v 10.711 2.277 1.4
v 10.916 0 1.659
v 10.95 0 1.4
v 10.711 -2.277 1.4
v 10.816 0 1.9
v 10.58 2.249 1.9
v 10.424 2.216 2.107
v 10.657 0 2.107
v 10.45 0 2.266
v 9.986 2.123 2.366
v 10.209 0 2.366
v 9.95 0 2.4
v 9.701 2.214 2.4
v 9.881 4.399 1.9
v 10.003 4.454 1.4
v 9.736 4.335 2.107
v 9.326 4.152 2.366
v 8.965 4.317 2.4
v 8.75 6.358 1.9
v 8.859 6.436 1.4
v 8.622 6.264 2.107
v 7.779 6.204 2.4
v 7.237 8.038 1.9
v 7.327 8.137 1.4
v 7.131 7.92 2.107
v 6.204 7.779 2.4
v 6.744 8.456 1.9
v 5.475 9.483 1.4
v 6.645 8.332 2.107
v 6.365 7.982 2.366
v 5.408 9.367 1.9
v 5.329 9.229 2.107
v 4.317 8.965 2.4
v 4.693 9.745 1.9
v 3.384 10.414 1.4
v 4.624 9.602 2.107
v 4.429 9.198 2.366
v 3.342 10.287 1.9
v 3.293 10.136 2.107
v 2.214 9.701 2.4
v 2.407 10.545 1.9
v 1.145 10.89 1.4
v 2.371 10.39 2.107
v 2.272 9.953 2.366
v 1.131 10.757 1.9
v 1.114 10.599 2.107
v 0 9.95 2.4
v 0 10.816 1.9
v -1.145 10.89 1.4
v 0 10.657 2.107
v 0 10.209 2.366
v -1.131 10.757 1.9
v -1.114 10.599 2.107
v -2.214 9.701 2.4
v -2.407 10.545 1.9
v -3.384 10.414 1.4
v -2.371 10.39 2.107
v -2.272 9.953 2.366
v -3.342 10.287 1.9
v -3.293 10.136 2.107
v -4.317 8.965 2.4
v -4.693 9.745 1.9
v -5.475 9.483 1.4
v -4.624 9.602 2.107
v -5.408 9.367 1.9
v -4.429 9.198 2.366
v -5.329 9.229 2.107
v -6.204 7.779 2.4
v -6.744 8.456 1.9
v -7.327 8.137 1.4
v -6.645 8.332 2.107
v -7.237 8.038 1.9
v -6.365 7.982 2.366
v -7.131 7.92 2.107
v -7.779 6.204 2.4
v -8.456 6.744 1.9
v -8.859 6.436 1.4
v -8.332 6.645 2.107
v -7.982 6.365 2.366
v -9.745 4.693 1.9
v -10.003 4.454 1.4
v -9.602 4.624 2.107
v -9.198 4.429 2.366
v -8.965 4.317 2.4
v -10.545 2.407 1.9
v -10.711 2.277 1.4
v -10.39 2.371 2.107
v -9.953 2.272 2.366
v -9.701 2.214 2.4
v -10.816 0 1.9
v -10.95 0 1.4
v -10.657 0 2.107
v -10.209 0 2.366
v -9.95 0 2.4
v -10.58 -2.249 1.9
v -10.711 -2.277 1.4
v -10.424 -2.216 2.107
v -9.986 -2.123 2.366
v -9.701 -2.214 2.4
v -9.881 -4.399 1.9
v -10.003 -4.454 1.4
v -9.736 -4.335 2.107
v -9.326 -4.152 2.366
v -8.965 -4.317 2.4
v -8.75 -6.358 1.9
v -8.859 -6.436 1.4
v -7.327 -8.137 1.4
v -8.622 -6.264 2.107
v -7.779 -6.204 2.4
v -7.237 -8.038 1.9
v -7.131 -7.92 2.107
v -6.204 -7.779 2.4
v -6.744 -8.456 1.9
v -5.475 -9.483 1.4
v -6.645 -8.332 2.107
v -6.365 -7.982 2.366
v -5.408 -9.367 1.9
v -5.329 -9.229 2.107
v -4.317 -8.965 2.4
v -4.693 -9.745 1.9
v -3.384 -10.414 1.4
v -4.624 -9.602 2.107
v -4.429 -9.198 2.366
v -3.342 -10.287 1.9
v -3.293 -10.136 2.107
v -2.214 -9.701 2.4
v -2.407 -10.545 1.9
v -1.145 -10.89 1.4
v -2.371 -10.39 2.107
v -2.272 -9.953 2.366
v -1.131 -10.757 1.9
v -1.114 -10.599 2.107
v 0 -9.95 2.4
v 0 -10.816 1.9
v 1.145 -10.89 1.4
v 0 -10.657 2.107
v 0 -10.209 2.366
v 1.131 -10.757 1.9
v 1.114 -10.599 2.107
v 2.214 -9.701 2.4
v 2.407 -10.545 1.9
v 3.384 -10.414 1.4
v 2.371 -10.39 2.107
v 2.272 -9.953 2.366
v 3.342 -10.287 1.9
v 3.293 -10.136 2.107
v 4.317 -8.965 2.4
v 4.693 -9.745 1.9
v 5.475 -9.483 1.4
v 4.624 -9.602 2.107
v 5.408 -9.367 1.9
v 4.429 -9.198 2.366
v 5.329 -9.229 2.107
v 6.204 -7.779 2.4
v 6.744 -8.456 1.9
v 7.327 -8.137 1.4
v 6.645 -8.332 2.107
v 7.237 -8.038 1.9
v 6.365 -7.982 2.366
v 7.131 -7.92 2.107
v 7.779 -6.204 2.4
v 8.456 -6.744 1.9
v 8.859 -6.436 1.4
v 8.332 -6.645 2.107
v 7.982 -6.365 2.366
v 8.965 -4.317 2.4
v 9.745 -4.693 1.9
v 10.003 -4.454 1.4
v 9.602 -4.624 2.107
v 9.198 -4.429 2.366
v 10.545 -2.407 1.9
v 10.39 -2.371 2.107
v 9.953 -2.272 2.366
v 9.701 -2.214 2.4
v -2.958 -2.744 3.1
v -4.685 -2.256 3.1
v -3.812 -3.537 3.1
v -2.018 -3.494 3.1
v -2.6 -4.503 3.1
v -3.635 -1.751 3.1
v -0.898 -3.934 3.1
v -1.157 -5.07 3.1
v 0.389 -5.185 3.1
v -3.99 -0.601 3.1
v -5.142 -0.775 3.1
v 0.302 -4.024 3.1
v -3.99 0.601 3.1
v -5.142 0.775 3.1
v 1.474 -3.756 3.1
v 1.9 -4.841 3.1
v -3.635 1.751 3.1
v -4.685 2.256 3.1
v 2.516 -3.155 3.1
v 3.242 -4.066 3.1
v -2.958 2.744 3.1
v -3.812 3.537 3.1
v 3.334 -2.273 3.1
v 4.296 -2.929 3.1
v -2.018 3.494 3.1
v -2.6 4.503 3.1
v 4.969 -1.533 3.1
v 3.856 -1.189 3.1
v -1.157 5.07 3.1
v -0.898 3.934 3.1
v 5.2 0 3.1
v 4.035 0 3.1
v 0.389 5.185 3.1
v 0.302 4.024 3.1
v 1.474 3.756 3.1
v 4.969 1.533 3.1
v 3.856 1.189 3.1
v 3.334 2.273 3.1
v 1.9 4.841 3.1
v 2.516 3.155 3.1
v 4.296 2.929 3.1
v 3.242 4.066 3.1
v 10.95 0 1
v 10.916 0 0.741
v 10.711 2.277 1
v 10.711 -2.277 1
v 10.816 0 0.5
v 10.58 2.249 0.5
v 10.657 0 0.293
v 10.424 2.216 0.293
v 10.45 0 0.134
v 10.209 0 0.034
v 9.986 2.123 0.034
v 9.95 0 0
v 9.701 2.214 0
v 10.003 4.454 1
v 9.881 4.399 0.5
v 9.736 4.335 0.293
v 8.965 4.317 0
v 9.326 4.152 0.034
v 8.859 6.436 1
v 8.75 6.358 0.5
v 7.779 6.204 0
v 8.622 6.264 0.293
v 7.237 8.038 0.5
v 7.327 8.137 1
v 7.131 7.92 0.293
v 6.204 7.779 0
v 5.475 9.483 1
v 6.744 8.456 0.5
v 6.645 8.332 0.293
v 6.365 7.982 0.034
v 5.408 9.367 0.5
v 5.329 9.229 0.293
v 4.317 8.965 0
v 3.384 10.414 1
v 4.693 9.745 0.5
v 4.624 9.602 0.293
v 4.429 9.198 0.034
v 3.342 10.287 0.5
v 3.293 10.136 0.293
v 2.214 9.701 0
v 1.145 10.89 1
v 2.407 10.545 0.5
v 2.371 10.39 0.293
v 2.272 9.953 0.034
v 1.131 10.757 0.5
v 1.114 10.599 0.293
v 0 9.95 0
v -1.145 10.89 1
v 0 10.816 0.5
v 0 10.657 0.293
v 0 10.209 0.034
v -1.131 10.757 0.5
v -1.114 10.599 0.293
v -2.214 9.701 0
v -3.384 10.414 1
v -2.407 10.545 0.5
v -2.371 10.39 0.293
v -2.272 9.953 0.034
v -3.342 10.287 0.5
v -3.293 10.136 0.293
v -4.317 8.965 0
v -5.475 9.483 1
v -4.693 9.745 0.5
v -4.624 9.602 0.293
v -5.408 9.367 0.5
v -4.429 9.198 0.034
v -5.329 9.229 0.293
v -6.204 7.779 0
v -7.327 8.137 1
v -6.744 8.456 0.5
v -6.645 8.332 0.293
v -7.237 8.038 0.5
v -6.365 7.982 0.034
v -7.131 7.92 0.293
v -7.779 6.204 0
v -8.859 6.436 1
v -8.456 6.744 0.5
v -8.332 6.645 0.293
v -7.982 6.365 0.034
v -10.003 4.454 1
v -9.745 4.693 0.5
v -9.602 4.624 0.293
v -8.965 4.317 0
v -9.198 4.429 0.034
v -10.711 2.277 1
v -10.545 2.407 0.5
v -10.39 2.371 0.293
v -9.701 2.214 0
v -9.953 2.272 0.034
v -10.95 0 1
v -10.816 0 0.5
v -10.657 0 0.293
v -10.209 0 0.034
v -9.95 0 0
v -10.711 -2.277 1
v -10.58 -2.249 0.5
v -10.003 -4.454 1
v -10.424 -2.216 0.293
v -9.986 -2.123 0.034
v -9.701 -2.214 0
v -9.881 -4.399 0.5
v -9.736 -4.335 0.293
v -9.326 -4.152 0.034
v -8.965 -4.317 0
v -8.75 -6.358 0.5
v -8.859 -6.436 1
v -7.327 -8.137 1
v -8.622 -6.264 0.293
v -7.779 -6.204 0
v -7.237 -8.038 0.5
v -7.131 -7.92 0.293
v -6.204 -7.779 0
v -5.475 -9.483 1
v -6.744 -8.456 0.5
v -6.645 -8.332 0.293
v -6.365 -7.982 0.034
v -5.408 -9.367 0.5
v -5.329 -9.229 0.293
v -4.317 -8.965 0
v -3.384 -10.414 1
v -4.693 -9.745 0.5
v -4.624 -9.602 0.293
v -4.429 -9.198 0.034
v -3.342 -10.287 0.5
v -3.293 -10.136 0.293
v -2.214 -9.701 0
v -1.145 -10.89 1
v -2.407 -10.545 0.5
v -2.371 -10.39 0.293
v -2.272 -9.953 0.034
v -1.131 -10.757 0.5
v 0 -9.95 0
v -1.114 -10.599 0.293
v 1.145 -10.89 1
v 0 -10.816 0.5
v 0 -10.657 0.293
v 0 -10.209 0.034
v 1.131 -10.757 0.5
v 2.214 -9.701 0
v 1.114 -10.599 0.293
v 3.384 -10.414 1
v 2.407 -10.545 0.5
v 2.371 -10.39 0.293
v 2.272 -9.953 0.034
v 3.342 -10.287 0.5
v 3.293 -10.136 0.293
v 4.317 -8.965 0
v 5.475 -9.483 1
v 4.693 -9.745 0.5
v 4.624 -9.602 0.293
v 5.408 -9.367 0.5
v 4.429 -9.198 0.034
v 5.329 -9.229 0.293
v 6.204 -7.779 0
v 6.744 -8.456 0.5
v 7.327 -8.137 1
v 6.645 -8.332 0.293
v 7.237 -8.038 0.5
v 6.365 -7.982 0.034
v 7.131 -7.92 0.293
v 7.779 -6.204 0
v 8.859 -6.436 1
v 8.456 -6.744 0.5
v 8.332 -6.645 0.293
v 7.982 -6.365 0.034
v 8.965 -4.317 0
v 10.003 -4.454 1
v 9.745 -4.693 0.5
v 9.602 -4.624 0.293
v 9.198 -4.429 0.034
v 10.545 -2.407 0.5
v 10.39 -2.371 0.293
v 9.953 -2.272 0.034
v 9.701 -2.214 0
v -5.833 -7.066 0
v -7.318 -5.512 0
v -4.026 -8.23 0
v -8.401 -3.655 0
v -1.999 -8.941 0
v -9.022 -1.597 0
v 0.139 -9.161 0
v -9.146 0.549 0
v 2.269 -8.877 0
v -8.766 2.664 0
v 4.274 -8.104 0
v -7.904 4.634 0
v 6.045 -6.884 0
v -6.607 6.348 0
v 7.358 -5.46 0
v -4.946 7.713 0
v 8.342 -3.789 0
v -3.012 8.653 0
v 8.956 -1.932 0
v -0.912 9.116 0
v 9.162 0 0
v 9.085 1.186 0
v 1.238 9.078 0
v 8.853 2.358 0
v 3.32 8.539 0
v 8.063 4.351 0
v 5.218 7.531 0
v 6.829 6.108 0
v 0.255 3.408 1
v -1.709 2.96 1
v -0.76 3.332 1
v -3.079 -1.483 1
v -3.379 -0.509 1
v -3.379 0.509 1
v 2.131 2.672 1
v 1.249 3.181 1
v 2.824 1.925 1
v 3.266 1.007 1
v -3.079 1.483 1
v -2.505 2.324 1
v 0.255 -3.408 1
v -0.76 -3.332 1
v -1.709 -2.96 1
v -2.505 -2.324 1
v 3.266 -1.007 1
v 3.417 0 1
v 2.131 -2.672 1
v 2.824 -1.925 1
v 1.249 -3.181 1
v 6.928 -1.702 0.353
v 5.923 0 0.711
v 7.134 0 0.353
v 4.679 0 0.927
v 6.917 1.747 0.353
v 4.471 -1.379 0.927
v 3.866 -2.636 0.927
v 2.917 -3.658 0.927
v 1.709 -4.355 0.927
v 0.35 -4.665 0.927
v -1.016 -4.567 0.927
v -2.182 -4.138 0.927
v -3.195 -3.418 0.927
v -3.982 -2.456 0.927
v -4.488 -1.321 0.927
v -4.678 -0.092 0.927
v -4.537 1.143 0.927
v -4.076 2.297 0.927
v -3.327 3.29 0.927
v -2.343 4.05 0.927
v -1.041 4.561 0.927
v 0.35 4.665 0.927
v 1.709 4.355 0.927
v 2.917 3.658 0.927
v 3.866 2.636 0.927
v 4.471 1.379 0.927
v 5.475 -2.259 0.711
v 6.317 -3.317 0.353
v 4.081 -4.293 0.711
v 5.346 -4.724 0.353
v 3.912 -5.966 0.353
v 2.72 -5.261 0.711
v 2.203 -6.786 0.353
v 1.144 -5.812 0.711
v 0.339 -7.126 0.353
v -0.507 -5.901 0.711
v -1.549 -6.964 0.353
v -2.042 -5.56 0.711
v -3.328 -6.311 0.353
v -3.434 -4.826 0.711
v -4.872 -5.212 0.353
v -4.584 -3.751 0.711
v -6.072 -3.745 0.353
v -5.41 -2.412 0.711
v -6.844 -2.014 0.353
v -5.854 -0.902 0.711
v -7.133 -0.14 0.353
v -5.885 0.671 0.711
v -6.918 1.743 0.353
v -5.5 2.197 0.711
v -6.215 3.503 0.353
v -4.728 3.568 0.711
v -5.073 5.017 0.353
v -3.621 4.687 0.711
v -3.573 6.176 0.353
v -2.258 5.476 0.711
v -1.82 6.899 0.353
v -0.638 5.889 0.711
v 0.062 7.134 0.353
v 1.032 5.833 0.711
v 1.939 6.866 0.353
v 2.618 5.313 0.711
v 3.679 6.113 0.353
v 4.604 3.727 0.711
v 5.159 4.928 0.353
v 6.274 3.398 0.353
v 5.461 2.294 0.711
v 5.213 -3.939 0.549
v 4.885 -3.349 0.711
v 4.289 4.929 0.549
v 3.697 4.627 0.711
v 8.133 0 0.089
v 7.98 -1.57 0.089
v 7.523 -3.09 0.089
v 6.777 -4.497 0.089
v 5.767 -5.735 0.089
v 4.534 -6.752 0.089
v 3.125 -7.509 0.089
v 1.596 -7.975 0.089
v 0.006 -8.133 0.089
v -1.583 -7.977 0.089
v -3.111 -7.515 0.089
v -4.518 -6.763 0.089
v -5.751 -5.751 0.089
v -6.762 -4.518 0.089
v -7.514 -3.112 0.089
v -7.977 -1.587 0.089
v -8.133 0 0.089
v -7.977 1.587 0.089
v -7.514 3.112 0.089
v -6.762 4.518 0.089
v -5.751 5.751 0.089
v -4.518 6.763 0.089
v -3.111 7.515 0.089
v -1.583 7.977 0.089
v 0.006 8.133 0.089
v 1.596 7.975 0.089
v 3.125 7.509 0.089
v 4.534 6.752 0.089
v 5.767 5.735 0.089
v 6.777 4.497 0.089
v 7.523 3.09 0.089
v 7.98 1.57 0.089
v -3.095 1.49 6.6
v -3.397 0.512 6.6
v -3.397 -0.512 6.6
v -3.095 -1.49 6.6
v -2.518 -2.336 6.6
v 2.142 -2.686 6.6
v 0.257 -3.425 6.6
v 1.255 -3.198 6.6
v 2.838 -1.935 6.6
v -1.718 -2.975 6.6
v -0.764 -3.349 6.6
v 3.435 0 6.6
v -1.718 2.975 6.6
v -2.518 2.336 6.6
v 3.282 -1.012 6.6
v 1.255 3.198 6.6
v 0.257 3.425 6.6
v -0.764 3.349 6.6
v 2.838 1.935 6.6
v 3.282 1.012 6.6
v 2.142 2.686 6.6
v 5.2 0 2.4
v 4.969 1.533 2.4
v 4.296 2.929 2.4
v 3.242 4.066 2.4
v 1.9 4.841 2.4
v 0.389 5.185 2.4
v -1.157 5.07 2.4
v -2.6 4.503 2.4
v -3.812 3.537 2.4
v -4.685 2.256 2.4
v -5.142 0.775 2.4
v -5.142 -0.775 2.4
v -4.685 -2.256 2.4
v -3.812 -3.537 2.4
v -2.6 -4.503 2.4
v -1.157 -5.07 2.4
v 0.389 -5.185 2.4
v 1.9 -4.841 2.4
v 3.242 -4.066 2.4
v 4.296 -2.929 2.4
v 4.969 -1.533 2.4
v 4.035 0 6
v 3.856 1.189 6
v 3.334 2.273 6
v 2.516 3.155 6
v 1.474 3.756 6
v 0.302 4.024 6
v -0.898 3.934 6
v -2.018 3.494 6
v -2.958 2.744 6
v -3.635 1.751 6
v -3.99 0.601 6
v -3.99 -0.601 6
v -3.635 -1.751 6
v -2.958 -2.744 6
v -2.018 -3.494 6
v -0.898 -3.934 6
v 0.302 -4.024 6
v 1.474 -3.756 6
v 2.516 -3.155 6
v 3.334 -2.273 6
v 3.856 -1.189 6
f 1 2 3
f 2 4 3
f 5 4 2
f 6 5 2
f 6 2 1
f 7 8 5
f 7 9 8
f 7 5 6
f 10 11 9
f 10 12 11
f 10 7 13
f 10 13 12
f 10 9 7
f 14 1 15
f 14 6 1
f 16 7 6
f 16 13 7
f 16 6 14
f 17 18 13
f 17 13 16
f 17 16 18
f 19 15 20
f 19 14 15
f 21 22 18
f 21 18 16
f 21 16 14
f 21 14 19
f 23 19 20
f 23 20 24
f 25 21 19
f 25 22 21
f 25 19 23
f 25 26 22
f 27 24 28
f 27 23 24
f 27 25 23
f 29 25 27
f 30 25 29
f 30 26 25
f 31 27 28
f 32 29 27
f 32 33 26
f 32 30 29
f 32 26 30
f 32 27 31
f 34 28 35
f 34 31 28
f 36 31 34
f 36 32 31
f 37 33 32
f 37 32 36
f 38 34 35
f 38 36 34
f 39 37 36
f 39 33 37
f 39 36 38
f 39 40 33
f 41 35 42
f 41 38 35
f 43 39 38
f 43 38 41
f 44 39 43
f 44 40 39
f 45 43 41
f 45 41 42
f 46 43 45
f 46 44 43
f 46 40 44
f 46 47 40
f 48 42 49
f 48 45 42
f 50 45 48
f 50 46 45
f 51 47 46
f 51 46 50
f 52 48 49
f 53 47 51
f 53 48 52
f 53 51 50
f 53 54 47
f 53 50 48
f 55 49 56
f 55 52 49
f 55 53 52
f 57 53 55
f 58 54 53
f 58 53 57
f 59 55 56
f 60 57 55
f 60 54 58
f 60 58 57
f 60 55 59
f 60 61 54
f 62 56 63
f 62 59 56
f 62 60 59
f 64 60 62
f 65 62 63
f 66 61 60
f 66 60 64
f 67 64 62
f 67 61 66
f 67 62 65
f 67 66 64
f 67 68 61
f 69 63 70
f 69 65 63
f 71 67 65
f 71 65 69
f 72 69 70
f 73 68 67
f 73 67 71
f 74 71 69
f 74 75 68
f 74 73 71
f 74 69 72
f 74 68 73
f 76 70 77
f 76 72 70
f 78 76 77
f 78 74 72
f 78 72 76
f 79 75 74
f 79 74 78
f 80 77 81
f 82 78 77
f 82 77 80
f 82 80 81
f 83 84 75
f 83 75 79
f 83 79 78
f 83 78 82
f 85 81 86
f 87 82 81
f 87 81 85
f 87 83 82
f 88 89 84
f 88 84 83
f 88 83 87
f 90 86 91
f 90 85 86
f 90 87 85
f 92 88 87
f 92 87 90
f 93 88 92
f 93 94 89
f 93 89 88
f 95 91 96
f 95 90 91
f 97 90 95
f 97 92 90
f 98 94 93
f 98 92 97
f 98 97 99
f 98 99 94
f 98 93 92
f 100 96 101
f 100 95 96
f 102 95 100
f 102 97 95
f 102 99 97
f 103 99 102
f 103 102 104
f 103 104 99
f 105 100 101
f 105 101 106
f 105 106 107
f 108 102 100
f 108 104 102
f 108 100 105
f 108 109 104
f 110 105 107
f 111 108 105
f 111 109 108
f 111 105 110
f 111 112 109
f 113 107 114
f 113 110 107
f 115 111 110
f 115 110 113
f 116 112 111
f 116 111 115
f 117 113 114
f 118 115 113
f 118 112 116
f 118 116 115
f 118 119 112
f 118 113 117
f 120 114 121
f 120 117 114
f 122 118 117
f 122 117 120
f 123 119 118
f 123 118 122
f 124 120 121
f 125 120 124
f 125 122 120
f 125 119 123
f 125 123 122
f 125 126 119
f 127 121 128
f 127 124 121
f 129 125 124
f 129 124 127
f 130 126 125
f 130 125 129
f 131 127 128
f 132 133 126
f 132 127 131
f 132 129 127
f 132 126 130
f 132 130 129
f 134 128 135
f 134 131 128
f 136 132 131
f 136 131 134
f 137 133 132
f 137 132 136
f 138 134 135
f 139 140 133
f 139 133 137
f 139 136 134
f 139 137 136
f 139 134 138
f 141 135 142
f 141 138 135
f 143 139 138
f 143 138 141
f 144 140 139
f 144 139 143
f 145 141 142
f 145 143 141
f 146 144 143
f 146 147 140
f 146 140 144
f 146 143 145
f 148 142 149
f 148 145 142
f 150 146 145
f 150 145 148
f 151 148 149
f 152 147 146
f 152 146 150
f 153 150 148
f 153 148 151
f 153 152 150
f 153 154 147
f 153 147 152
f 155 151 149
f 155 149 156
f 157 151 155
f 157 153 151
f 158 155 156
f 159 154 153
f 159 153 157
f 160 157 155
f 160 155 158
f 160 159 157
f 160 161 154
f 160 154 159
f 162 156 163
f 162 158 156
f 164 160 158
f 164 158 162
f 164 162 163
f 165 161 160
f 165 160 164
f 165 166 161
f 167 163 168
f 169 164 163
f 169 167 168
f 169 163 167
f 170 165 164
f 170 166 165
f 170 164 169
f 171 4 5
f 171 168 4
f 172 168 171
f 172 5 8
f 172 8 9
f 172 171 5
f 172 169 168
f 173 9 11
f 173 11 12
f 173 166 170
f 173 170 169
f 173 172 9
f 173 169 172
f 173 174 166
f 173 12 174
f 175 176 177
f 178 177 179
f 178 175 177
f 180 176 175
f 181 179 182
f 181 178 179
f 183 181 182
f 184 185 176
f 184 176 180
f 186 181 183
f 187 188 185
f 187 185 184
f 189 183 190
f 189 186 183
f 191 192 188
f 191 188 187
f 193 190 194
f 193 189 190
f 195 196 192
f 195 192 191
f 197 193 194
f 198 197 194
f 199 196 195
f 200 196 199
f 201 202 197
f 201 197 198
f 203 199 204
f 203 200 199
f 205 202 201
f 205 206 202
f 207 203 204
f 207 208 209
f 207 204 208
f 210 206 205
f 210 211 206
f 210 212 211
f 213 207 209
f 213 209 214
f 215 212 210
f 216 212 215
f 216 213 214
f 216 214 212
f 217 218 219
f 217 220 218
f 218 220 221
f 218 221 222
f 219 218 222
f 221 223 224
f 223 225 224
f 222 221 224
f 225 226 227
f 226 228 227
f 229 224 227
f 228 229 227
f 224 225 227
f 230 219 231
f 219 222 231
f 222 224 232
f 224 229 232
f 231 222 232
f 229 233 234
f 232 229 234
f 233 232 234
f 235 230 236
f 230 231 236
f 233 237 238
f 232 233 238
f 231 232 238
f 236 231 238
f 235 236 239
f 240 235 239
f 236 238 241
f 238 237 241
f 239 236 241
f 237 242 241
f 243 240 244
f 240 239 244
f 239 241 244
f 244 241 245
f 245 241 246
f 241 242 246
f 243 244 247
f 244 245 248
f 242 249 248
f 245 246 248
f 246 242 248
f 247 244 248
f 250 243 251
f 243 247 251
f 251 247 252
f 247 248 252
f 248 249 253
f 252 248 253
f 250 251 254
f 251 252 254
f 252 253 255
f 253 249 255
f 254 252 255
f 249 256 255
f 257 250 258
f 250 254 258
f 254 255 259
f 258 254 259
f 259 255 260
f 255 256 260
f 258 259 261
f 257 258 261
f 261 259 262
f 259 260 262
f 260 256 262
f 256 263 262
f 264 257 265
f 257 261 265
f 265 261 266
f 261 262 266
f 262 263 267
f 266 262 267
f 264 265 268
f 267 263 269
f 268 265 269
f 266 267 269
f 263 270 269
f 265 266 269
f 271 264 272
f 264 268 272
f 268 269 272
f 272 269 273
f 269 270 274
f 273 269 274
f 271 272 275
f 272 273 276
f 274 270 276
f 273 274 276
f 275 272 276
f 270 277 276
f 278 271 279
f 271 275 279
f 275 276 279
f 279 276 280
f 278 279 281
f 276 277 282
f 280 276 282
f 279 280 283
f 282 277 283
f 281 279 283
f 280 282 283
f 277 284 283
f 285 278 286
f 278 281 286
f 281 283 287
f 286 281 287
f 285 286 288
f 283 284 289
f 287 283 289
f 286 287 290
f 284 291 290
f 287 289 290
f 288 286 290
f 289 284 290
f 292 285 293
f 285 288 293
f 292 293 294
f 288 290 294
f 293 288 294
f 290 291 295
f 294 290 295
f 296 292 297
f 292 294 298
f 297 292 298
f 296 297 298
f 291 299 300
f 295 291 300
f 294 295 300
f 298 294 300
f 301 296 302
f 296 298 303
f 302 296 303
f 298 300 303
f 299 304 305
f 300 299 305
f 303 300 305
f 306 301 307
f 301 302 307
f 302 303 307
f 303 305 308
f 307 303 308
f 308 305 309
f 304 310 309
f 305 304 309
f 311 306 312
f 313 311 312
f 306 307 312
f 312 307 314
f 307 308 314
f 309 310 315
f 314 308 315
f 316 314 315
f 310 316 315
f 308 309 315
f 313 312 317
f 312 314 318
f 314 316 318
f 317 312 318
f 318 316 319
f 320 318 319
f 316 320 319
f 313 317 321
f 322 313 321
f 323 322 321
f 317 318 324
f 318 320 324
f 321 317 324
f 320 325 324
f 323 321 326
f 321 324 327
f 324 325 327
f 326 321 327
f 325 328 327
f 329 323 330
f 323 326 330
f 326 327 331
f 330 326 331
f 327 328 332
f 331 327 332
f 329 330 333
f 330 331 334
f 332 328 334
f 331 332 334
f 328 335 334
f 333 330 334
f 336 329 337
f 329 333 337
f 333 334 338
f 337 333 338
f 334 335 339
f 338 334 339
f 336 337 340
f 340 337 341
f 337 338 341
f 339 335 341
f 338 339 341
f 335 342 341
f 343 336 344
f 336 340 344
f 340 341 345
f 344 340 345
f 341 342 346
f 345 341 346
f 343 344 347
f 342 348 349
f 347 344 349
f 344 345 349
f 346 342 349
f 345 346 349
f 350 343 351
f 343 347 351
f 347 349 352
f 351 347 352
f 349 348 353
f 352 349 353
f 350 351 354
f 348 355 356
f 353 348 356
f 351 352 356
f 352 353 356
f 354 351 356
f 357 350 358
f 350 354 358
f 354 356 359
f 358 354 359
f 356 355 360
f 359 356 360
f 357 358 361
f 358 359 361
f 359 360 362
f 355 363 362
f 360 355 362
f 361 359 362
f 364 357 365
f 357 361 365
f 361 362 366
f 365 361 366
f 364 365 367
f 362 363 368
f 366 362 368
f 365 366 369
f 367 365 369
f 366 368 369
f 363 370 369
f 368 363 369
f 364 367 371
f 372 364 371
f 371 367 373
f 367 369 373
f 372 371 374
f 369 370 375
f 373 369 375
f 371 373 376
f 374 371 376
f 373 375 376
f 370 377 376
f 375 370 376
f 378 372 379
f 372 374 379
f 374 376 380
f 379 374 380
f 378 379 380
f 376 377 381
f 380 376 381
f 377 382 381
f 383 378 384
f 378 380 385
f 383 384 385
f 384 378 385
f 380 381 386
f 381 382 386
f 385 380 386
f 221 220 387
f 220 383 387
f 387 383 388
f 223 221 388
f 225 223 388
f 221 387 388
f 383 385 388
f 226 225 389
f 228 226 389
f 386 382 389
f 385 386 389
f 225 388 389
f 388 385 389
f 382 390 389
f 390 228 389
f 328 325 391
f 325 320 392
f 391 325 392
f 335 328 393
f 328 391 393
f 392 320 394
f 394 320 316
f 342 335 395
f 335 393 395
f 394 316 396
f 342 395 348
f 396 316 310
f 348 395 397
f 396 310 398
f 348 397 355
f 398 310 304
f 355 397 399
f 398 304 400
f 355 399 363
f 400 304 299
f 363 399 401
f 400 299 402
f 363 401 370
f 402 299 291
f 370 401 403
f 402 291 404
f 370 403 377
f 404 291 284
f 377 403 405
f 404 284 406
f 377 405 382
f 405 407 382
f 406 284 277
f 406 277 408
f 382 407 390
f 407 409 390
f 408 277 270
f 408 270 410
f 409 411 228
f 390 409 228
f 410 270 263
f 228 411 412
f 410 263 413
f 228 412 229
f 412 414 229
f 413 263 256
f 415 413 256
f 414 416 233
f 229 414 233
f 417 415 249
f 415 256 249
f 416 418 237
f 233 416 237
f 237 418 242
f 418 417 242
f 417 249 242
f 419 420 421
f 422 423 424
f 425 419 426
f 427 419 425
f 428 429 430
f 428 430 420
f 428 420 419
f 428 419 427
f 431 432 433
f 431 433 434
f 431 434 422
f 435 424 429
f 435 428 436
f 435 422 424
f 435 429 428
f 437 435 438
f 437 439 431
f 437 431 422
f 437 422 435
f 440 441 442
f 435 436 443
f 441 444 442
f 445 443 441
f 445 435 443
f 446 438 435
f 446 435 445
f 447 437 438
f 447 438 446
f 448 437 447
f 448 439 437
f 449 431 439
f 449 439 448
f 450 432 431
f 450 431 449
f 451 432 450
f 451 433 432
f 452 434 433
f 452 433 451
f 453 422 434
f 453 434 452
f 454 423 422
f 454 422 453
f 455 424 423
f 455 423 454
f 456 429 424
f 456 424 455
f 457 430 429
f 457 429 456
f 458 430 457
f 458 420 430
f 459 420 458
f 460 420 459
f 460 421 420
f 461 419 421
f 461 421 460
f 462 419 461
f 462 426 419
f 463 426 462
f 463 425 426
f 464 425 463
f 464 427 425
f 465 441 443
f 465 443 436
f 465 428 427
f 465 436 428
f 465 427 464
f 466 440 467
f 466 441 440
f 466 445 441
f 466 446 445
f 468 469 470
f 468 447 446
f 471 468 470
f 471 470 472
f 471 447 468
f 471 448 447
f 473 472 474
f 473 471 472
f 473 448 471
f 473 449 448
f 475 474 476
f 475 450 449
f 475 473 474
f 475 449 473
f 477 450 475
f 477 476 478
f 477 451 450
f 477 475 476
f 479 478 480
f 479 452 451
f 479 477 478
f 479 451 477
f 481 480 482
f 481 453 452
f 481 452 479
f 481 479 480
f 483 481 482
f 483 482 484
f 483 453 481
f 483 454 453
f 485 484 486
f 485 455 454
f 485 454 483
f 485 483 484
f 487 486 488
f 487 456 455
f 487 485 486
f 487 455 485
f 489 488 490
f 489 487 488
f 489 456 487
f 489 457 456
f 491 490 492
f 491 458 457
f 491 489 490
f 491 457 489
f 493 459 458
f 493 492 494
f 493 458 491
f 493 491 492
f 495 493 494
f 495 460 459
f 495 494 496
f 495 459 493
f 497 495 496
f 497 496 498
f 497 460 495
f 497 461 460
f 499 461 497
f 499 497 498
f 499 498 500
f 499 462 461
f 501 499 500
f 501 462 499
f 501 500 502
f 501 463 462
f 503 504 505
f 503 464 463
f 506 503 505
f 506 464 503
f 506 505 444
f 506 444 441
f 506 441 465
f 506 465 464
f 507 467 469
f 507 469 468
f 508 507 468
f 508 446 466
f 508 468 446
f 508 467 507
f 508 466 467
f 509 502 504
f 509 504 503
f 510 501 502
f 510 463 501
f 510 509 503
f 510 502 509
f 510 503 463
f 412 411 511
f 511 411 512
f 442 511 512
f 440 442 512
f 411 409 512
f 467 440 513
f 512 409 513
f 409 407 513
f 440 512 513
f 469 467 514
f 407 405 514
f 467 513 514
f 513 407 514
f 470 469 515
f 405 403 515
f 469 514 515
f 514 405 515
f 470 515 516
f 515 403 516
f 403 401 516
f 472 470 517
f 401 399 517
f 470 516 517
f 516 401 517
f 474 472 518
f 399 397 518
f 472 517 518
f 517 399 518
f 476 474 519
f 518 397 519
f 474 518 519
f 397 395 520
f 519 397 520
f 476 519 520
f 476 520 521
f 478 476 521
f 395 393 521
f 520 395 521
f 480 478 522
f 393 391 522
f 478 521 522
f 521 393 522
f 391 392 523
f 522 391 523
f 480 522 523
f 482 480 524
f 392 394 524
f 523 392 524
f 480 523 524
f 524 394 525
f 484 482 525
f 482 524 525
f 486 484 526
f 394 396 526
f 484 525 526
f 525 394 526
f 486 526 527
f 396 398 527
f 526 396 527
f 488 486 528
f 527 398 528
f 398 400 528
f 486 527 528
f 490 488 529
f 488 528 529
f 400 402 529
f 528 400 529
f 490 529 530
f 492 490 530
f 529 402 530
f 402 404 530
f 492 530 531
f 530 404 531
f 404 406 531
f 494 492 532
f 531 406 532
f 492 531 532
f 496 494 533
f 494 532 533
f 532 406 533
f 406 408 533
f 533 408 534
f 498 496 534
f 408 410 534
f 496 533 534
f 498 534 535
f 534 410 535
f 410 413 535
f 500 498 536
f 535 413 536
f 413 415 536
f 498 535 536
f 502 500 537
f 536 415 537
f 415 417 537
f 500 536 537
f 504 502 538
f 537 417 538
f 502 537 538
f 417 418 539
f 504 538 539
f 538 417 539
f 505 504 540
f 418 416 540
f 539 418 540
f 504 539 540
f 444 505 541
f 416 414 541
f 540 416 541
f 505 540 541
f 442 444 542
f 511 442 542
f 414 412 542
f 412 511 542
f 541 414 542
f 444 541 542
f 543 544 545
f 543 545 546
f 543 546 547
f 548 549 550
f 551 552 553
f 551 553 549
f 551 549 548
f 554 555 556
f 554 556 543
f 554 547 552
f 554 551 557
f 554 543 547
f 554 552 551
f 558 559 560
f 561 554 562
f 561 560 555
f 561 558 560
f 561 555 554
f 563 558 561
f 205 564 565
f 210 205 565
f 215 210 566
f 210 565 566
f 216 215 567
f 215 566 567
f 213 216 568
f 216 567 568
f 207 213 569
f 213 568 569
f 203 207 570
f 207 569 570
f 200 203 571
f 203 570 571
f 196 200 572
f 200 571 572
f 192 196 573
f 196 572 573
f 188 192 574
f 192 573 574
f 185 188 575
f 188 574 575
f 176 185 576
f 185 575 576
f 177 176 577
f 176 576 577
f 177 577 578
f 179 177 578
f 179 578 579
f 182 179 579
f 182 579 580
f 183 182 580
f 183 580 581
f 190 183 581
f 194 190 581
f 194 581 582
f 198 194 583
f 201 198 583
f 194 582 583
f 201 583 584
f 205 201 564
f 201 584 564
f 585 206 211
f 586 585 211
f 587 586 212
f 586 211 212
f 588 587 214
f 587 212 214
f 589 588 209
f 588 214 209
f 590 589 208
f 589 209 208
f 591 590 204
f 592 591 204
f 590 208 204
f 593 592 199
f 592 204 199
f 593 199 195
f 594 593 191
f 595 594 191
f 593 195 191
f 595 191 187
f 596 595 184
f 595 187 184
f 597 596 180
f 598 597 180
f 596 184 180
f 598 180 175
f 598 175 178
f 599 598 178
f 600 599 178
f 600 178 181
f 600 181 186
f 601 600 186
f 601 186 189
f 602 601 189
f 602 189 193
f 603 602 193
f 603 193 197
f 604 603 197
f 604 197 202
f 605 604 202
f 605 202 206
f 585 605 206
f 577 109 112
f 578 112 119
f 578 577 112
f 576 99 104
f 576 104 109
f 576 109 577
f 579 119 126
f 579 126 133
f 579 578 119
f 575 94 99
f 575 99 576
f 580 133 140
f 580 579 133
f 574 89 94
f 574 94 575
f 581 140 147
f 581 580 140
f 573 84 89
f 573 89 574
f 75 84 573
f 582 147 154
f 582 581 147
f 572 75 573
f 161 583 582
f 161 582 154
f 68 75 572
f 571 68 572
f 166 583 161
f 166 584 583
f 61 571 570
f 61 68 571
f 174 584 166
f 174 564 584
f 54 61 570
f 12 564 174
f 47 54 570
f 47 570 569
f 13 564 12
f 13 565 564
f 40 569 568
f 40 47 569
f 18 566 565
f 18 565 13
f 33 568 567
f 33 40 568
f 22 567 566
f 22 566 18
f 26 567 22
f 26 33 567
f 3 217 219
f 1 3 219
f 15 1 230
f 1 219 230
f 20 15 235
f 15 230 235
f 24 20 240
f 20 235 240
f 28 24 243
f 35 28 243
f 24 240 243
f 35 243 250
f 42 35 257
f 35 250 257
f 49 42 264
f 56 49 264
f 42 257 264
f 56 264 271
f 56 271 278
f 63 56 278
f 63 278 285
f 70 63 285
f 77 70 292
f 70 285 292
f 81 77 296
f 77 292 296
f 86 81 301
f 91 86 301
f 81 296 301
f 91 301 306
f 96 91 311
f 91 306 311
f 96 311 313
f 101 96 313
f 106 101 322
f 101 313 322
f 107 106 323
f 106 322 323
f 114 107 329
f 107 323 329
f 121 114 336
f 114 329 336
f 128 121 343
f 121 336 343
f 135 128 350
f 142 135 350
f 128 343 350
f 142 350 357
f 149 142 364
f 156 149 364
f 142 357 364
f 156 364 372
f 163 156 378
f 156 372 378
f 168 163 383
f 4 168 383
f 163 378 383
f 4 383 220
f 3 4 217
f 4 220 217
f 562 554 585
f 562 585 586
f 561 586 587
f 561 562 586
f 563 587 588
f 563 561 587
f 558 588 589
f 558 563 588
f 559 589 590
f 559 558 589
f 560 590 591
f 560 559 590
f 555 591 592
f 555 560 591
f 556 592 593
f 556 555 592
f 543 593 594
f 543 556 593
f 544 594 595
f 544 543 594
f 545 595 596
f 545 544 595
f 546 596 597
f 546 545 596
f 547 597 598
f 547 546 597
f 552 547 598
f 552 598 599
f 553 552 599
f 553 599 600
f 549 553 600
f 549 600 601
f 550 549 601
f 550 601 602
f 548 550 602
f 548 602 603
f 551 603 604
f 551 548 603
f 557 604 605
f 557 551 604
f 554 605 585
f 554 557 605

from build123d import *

# Parameters (mm, degrees)
F0_R     = 10.95
F1_DEPTH = 2.4
F2_R     = 4.035
F3_DEPTH = 4.2
F4_R     = 1
F5_R     = 5.2
F5_R_2   = 4.035
F6_DEPTH = 0.7
F7_R     = 1
F8_R     = 8
F9_DEPTH = 1
F11_SIZE = 0.6
F12_R    = 6


# Not quite as in the source:
# - a fillet or chamfer that OpenCascade refuses, or shapes differently, is made with other operations: its cross-section is extruded or revolved along the edge and cut away or added


with BuildPart() as f1:
    # F0 (on Top) → F1 (new body)
    with BuildSketch(Plane.XY):
        Circle(F0_R)
    extrude(amount=F1_DEPTH)

    # F2 (on face) → F3 (join)
    with BuildSketch(Plane.XY.offset(2.4)):
        Circle(F2_R)
    extrude(amount=F3_DEPTH)

    # F4
    f4_edges = [f1.edges().sort_by_distance(p)[0] for p in [
        (-10.95, 0, 2.4),
    ]]
    fillet(f4_edges, radius=F4_R)

    # F5 (on face) → F6 (join)
    with BuildSketch(Plane.XY.offset(2.4)):
        Circle(F5_R)
        Circle(F5_R_2, mode=Mode.SUBTRACT)
    extrude(amount=F6_DEPTH)

    # F7
    f7_edges = [f1.edges().sort_by_distance(p)[0] for p in [
        (-10.95, 0, 0),
    ]]
    fillet(f7_edges, radius=F7_R)

    # F8 (on face) → F9 (cut)
    with BuildSketch(Plane(origin=(0, 0, 0), x_dir=(1, 0, 0), z_dir=(0, 0, -1))):
        Circle(F8_R)
    extrude(amount=-F9_DEPTH, mode=Mode.SUBTRACT)

    # F10: fillet of radius 11 on 1 edges, made by hand

    # F10_s1 → F10_t2 (revolve)
    with BuildSketch(Plane.XZ):
        with BuildLine():
            ThreePointArc((8, 0), (5.762632185, 0.7470926301), (3.417424305, 1))
            Line((3.417424305, 1), (8, 1))
            Line((8, 1), (8, 0))
        make_face()
    revolve(axis=Axis((0, 0, 1), (0, 0, -1)))

    # F11
    f11_edges = [f1.edges().sort_by_distance(p)[0] for p in [
        (-4.035, 0, 6.6),
    ]]
    chamfer(f11_edges, length=F11_SIZE)

    # F12
    f12_edges = [f1.edges().sort_by_distance(p)[0] for p in [
        (-8, 0, 0),
    ]]
    fillet(f12_edges, radius=F12_R)


solid = f1.part
